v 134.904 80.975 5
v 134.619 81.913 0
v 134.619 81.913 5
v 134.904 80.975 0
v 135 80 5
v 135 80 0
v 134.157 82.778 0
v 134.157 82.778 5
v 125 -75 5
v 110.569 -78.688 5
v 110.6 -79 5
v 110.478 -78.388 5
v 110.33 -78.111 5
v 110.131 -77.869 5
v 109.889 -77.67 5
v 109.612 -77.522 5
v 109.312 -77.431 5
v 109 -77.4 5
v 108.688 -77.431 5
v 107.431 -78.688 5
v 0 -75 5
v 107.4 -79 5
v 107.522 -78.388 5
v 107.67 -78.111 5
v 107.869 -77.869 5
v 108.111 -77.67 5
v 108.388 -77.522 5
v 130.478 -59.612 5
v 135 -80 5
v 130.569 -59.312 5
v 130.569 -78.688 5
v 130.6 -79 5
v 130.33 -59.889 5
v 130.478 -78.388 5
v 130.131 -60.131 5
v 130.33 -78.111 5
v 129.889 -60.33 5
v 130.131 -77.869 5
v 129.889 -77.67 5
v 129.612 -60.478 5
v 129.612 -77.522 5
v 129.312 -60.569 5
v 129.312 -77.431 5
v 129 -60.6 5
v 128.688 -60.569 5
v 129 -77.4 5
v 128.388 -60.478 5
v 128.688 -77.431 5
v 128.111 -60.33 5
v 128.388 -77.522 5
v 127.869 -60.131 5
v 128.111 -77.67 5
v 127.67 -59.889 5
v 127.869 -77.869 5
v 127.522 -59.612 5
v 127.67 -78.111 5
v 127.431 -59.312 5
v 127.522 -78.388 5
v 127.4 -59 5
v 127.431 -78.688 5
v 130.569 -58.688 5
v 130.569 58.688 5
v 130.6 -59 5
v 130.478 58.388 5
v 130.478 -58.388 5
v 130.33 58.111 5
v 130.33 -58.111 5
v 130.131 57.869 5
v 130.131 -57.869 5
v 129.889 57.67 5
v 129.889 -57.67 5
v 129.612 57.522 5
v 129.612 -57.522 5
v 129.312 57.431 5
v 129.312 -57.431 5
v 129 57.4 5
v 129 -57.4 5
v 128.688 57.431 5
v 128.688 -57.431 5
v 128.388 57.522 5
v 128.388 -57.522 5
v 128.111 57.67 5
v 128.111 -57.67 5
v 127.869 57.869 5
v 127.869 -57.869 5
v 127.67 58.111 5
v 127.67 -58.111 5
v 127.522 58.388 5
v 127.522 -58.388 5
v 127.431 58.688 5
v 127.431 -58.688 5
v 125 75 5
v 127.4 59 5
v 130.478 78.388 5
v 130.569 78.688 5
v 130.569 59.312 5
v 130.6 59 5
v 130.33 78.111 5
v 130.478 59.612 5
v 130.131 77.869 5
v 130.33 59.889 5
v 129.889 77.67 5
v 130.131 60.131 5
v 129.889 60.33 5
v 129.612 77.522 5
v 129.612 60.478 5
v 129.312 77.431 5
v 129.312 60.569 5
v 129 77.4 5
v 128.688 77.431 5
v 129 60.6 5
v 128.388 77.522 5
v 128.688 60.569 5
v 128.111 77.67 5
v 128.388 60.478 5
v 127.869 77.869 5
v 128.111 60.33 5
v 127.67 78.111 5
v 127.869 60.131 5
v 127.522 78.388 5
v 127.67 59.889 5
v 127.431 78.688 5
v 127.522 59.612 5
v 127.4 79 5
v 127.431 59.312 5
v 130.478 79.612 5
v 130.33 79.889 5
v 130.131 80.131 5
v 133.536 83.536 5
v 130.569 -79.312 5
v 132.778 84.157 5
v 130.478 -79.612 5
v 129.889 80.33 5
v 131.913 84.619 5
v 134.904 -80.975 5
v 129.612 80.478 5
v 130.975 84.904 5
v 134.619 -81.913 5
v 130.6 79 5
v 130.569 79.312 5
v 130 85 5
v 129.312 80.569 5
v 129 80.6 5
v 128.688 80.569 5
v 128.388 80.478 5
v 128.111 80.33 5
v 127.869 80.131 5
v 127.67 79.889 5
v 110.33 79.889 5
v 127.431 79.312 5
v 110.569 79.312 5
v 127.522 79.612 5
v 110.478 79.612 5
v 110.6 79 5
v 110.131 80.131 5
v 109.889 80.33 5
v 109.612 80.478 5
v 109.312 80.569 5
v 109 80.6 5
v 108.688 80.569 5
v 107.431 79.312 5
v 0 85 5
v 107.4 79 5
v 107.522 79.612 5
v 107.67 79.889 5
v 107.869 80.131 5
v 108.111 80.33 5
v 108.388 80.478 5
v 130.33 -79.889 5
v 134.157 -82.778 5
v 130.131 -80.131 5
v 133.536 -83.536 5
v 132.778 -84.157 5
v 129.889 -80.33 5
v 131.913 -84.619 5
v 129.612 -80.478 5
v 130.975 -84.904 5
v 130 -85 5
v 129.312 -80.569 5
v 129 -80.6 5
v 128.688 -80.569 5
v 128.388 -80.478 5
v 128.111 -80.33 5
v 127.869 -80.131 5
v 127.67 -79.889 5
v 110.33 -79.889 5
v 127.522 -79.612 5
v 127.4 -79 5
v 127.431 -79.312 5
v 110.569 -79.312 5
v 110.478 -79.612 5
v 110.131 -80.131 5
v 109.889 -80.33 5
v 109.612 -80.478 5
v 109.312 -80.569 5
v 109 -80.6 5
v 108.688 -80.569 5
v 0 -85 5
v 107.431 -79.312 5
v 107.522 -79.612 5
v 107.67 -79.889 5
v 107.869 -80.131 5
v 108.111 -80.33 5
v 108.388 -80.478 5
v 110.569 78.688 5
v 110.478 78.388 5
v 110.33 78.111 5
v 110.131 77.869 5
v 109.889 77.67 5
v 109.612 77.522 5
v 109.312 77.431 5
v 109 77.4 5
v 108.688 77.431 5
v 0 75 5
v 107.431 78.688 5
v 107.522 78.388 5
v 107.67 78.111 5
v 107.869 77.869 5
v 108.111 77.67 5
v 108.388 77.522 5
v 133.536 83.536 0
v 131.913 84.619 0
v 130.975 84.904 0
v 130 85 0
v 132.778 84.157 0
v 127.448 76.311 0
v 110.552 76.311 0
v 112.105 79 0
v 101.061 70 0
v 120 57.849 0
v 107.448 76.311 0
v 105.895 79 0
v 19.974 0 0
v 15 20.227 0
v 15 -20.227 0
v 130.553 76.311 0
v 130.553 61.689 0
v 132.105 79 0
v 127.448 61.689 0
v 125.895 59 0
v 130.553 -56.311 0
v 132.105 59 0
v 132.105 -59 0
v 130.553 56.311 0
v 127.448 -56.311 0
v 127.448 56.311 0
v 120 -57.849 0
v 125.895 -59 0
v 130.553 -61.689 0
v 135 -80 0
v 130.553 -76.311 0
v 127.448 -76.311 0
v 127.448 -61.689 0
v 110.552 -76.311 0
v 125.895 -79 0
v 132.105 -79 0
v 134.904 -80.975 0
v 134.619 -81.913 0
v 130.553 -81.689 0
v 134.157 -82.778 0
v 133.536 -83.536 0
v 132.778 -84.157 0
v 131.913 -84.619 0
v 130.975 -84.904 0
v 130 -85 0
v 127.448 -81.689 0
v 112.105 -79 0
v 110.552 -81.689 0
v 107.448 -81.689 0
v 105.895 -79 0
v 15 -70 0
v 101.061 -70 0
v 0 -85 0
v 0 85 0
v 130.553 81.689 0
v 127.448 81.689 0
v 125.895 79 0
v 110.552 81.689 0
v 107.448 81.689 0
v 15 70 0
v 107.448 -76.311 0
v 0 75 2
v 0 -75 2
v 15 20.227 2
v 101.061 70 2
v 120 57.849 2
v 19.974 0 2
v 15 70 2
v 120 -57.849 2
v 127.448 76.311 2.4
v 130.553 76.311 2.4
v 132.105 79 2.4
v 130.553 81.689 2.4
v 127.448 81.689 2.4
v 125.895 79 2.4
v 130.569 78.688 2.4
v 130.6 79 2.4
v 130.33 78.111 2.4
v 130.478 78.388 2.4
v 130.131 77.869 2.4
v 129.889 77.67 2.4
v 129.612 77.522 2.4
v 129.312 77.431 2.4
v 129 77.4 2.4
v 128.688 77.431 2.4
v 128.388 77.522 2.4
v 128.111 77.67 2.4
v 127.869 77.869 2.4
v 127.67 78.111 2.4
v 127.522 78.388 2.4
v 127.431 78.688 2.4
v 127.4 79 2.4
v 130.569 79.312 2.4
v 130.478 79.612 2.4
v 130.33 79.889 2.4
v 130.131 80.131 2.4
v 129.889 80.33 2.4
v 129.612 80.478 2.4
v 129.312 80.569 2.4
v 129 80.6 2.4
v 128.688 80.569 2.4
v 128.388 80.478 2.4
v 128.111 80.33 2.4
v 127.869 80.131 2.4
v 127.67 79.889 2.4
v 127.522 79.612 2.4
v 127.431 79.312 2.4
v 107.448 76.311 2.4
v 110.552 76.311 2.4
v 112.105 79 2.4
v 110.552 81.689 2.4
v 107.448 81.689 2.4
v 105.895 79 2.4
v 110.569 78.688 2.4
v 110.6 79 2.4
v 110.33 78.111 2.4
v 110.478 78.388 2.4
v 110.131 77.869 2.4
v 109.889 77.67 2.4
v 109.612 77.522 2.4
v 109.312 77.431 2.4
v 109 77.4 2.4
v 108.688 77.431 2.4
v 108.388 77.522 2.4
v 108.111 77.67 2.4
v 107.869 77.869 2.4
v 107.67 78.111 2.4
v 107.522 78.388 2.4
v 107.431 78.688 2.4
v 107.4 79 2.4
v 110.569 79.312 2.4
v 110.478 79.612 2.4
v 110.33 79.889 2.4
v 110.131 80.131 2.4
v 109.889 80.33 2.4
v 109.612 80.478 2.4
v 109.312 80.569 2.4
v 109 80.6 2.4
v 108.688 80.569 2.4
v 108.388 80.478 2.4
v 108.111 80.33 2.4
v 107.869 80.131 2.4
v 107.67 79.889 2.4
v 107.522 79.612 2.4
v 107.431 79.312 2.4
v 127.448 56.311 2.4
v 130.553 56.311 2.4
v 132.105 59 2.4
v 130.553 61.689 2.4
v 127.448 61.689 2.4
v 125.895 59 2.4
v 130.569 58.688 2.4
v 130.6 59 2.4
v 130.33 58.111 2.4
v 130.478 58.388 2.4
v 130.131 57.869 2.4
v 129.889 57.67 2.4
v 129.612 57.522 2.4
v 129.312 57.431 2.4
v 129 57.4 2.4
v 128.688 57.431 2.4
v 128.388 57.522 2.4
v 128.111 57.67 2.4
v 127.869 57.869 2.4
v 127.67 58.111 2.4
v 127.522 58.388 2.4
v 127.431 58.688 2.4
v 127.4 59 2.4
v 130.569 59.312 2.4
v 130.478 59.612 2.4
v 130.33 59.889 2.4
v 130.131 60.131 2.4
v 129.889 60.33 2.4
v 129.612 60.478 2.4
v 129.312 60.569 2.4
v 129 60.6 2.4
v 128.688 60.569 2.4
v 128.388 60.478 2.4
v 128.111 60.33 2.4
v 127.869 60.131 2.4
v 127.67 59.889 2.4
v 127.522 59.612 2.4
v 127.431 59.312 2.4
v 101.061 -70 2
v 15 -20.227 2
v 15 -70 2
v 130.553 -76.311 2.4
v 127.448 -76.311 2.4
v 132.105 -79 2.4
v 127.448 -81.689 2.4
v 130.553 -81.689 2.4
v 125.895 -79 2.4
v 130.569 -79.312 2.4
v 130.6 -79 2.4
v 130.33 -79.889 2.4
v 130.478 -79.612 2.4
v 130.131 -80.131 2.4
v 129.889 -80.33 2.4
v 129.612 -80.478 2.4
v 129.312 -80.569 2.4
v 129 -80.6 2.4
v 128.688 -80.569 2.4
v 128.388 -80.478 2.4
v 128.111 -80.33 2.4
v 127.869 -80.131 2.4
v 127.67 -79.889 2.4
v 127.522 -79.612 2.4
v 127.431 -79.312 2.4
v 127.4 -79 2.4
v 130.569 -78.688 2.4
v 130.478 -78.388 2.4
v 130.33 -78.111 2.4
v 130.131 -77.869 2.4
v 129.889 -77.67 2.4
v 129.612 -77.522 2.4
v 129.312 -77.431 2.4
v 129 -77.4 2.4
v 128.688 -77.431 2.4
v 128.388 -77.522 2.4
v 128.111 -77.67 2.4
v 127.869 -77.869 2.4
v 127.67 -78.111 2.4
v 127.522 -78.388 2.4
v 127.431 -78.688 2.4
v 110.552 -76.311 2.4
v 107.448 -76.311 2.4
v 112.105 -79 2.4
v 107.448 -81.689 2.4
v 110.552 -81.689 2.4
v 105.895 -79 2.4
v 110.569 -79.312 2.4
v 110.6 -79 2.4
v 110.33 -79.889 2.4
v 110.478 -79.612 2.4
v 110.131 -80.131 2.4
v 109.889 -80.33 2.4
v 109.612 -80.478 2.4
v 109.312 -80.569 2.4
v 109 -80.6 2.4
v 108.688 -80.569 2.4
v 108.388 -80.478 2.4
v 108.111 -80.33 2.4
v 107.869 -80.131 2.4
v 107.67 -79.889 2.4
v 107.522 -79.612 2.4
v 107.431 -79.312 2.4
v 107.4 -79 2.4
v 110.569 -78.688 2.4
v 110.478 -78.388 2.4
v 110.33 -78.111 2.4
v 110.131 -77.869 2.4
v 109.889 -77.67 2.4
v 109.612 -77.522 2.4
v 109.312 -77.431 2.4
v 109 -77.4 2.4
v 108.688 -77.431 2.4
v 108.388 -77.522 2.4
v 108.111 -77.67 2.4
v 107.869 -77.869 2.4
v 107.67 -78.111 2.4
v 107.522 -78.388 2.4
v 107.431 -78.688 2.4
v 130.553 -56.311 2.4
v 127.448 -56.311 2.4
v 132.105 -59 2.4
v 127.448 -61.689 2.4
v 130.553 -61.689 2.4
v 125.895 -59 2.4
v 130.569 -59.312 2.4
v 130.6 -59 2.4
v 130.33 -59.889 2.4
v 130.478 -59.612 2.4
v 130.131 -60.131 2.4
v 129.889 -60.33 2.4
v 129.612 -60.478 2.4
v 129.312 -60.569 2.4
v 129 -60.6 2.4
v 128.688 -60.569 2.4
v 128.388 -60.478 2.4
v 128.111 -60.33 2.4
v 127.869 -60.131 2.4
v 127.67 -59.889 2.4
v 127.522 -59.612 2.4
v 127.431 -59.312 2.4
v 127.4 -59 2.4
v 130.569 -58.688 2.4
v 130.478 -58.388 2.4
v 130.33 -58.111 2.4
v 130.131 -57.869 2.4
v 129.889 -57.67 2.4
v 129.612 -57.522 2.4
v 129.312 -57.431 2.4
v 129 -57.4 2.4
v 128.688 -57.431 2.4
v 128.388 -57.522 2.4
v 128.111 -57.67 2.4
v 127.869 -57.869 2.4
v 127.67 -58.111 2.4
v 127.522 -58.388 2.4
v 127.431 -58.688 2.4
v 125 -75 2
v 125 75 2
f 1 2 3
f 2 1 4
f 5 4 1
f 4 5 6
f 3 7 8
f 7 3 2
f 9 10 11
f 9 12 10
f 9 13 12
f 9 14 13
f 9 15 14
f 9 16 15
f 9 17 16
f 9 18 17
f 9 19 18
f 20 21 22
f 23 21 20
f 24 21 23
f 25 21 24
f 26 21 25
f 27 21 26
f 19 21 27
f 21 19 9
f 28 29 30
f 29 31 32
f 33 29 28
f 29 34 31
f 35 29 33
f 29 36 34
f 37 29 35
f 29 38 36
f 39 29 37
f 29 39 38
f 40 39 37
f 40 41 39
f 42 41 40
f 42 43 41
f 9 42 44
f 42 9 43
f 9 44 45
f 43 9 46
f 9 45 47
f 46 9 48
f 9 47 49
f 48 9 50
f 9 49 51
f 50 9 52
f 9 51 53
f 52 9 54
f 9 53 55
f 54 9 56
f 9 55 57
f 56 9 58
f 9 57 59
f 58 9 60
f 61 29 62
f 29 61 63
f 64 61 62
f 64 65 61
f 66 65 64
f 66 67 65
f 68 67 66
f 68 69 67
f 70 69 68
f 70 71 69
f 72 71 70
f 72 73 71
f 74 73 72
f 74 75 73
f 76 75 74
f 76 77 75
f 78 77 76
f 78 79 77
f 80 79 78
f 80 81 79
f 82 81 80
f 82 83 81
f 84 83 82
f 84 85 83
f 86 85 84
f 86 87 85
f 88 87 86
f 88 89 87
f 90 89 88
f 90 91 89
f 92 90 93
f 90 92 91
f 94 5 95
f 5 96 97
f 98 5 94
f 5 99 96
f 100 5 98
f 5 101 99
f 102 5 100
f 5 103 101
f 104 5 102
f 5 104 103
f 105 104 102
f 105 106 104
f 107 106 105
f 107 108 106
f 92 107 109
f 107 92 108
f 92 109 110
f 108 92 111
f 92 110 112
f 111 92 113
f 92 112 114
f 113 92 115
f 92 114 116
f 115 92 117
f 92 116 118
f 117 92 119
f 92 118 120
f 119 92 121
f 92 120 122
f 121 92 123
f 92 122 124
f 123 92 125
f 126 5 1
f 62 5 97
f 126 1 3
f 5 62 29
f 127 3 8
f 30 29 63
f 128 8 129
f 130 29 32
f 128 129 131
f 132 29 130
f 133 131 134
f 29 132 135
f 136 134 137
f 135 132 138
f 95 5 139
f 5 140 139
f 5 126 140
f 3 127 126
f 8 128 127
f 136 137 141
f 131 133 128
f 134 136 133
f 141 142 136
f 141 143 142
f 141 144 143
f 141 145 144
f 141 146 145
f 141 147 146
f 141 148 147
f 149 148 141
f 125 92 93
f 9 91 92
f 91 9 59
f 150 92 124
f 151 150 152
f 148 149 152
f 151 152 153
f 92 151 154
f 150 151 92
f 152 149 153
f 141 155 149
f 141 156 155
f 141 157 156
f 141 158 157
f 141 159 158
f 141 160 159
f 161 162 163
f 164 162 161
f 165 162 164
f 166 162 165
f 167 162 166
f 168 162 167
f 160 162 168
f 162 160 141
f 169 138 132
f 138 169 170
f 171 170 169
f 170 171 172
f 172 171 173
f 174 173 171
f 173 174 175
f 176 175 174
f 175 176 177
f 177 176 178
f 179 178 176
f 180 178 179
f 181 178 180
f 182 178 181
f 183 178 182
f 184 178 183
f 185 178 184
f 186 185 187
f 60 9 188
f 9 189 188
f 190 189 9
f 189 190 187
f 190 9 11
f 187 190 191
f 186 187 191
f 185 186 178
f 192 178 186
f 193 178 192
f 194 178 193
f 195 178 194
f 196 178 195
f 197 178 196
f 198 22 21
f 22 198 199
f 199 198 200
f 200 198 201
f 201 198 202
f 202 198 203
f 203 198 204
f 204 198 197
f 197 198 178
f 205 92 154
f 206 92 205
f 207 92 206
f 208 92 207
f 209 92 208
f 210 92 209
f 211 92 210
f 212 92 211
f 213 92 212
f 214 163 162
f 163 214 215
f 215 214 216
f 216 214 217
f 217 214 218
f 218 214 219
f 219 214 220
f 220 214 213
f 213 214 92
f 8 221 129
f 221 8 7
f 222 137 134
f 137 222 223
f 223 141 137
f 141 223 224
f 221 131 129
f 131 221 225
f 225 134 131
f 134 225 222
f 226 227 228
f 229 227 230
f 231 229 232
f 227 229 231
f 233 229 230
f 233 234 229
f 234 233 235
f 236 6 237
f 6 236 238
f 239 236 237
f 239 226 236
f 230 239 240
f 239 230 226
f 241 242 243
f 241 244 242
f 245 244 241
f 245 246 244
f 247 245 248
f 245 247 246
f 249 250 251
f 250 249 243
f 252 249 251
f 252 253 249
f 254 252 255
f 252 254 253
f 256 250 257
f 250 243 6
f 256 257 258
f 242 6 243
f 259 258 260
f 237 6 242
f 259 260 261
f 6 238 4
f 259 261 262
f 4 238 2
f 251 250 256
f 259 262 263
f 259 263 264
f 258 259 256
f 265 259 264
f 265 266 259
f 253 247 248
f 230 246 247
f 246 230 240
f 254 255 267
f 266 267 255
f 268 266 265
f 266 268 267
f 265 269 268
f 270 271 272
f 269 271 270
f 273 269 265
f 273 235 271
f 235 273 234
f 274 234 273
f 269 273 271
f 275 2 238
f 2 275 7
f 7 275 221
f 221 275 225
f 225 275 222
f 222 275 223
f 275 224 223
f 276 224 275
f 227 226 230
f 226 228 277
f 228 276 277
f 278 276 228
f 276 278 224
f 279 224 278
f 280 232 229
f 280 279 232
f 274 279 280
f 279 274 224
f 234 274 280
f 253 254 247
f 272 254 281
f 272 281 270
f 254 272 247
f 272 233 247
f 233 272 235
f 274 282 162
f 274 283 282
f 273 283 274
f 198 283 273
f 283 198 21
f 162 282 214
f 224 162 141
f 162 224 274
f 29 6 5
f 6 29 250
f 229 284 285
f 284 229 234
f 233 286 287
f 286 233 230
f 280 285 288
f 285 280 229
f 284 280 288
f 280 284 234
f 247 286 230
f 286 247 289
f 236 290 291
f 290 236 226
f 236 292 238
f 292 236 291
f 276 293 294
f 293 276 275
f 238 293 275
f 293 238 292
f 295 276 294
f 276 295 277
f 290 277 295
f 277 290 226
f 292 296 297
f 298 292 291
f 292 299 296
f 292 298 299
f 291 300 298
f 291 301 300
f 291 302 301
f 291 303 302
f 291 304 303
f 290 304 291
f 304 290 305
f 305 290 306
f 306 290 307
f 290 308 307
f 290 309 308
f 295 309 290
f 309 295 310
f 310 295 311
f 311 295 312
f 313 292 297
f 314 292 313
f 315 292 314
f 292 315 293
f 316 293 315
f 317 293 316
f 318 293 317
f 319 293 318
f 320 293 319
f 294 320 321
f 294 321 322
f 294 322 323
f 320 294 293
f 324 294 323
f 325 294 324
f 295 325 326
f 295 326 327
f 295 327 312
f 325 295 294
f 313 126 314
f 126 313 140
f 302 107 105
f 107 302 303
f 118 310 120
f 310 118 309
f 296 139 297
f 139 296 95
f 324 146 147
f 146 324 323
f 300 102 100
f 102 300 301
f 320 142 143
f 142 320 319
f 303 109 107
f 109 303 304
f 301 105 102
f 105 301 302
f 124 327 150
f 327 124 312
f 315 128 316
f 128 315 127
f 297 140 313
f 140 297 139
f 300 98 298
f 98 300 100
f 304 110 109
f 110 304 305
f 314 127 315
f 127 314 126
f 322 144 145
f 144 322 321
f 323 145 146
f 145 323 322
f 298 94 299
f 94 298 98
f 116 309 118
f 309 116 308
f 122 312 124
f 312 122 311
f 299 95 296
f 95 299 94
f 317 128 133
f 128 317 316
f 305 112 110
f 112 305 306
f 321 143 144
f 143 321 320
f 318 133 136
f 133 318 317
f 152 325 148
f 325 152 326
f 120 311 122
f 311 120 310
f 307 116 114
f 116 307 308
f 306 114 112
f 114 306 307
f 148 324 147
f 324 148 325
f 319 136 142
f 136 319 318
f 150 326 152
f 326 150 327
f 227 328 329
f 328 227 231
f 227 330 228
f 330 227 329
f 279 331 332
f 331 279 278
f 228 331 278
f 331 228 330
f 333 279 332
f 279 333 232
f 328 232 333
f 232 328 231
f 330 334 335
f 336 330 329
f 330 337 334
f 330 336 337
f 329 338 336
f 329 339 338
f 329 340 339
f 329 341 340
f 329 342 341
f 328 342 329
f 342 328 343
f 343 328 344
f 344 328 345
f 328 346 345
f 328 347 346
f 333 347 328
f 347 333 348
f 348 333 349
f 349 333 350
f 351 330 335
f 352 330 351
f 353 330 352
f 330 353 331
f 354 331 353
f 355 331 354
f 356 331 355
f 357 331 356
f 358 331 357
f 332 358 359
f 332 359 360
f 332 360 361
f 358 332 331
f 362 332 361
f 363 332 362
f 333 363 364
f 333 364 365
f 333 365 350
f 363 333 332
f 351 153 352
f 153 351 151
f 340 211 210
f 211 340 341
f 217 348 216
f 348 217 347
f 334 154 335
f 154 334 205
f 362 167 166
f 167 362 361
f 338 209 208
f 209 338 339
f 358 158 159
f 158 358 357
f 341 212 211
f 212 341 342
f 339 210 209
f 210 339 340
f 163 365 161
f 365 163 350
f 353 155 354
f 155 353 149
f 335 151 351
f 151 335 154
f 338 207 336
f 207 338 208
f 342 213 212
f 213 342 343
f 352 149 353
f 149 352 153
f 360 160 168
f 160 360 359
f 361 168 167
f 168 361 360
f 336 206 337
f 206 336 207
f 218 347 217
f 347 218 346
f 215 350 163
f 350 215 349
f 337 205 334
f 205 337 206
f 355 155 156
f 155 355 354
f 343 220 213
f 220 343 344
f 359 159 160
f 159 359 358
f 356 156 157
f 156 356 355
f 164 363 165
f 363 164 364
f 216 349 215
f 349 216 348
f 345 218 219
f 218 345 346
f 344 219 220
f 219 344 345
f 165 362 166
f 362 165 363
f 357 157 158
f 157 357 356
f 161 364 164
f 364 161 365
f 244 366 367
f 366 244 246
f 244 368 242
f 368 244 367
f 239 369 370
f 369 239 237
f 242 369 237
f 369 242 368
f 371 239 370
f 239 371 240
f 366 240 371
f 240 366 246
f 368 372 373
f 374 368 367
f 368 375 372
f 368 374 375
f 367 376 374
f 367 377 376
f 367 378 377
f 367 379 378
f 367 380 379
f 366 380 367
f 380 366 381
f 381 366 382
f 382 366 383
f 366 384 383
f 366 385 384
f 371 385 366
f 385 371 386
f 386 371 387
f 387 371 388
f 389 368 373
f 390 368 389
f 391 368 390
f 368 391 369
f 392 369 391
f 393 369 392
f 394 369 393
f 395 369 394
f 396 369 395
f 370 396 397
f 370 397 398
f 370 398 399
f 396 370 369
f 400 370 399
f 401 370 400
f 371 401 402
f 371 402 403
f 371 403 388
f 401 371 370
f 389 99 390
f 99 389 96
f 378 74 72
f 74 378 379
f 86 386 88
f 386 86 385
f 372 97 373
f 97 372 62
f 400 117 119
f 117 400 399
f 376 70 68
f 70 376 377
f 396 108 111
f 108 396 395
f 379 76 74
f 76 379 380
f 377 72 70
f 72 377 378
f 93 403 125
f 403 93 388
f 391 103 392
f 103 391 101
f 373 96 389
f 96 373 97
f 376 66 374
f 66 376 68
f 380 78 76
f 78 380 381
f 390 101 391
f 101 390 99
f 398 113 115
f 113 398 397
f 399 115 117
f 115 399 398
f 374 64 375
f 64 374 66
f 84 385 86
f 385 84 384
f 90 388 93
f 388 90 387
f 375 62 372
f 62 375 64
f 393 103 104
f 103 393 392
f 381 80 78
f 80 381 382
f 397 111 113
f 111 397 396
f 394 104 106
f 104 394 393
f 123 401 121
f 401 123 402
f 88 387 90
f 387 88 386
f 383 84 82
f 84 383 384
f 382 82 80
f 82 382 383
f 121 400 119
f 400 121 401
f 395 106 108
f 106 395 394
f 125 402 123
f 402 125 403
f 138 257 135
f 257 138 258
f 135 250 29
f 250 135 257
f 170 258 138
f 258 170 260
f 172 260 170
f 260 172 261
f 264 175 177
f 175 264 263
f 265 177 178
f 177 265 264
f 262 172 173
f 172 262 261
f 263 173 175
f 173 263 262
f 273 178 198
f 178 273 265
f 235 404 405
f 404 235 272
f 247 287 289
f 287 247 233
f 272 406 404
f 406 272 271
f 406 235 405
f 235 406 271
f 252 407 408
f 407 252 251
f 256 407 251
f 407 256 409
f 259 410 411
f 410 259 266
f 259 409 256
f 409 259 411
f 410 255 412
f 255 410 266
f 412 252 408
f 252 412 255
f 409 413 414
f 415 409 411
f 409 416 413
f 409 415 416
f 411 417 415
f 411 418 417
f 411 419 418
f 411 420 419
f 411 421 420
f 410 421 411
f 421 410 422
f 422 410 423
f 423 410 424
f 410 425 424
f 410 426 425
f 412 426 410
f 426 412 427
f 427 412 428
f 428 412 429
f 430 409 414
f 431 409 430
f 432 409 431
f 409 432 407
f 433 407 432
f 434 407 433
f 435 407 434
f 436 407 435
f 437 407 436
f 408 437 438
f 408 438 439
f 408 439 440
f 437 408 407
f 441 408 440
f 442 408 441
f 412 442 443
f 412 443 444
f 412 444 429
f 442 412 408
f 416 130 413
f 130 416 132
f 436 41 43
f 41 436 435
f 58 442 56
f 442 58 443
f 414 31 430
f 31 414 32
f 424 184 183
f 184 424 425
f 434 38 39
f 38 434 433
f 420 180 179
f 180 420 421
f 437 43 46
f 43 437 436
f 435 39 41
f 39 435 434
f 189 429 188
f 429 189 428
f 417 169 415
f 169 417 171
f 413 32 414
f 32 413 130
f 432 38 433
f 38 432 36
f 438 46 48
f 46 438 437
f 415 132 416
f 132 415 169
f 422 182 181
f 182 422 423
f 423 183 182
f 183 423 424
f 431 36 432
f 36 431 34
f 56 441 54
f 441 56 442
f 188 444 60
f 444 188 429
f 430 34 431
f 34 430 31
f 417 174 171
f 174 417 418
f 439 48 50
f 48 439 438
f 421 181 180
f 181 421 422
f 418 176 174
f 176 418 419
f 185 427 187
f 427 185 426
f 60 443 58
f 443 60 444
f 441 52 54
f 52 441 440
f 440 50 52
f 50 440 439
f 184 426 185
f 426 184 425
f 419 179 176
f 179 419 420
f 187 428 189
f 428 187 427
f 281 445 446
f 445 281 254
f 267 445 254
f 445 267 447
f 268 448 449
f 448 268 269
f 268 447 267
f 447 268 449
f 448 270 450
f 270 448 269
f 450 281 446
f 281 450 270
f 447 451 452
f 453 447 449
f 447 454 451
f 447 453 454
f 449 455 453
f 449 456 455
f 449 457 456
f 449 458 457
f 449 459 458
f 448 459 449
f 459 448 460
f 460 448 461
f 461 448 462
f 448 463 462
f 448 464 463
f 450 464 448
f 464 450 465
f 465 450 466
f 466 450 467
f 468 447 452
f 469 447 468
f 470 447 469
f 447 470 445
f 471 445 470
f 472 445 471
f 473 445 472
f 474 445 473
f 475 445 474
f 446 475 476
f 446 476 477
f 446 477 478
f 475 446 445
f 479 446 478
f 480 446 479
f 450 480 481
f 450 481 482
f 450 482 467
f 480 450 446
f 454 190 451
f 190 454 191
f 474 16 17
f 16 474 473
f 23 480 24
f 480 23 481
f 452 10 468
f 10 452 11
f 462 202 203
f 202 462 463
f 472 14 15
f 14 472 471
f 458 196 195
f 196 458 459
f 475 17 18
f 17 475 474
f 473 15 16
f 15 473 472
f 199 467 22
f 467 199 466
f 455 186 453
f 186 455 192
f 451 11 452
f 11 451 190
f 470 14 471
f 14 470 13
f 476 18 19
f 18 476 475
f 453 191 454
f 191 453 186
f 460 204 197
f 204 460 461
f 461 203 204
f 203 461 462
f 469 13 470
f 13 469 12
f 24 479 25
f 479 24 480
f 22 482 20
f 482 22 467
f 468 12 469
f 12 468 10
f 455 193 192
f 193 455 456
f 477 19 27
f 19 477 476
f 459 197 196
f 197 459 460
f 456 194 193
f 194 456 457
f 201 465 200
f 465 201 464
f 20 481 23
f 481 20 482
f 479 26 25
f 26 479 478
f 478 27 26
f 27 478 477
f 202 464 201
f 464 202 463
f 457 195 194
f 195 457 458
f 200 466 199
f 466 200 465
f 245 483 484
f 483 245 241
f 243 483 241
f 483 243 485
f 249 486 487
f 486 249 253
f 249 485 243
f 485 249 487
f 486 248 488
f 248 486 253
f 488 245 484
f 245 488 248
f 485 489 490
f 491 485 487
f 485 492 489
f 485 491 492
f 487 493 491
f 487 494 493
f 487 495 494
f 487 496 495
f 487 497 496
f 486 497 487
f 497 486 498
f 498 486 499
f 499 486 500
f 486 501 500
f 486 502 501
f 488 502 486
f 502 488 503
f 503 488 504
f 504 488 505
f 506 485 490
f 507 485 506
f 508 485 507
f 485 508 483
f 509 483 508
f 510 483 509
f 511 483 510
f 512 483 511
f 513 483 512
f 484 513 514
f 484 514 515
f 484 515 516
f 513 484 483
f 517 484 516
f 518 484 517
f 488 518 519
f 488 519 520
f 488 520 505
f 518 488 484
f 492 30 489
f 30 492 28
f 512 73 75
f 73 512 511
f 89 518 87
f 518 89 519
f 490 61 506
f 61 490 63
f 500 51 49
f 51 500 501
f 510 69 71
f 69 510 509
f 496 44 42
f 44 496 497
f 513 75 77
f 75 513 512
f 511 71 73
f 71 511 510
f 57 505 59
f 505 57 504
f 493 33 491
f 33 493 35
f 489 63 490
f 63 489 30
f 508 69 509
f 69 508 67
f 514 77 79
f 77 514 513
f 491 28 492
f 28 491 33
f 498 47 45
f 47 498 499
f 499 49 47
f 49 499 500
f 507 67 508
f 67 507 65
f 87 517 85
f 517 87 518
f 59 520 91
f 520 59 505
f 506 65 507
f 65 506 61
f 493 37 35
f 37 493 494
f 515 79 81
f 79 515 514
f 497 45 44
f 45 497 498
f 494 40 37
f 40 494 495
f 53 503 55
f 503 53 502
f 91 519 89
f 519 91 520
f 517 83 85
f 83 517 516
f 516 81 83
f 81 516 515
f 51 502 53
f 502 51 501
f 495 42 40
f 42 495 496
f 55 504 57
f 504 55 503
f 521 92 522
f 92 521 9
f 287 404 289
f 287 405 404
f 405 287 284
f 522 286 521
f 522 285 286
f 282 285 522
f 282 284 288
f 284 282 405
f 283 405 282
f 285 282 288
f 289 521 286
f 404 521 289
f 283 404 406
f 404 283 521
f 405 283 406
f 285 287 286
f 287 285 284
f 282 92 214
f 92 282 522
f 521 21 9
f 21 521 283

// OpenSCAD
// file: ../common/din/base.scad
DIN_TOLERANCE = 0.1;

module din_help(name, _STD_TABLE) {
    echo("-----------------------------");
    echo(str("Size indexes for ", name));
    for(idx=[0:len(_STD_TABLE)-1]) {
        echo(str(idx, " = M", _STD_TABLE[idx][0]));
    }
    echo("-----------------------------");
}

module din_cutout_base(inner, outer, cap_height, height, fn) {
    translate([0, 0, height]) {
        mirror([0, 0, 1]) {
            cylinder(r=outer/2 + DIN_TOLERANCE, h=cap_height, center=false, $fn = fn);
            cylinder(r=inner/2 + DIN_TOLERANCE, h=height + 0.1, center=false, $fn = 32);
        }
    }
}

module hex_nut(inner, outer, cap_height, height = 0) {
    din_cutout_base(inner, outer, cap_height, height, 6);
}

module round_bolt(inner, outer, cap_height, height = 0) {
    din_cutout_base(inner, outer, cap_height, height, 32);
}

translate([-10, 0, 0]) round_bolt(inner = 3, outer = 6.01, cap_height = 2.4, height = 10);
translate([10, 0, 0]) hex_nut(inner = 3, outer = 6.01, cap_height = 2.4, height = 10);
// file: ../common/din/din934.scad
use <./base.scad>
/*
    format: [size, diameter, cap_height]
            [d1, e, m]
*/
_DIN_934_STD = [[1,2.72,0.8],[1.2,3.29,1],[1.4,3.29,1.2],[1.6,3.48,1.3],[1.7,3.82,1.4],[2,4.32,1.6],[2.3,4.95,1.8],[2.5,5.45,2],[2.6,5.51,2],[3,6.01,2.4],[3.5,6.01,2.8],[4,7.66,3.2],[5,8.76,4],[6,11.05,5],[7,12.12,5.5],[8,14.38,6.5],[10,18.9,8],[12,21.1,10],[14,24.49,11],[16,26.75,13],[18,29.56,15],[20,32.95,16],[22,35.03,18],[24,39.55,19],[27,45.2,22],[30,50.85,24],[33,55.37,26],[36,60.79,29],[39,66.44,31],[42,71.3,34],[45,76.95,36],[48,82.6,38],[52,88.25,42],[56,95.07,45],[60,100.72,48],[64,106.37,51],[68,112.02,54],[72,117.67,58],[76,123.32,61],[80,128.97,64],[85,133.11,68],[90,145.77,72],[95,151.42,76],[100,162.72,80],[105,16837,84],[110,174.02,88],[115,185.32,92],[120,190.97,96],[125,202.27,100],[130,207.75,104],[135,213.4,108],[140,224.7,112],[145,236,116],[150,236,120]];

module din934_help() {
    din_help("DIN 934", _DIN_934_STD);
}

module din934_base(m_idx, height) {
    row = _DIN_934_STD[m_idx];
    inner = row[0];
    outer = row[1];
    cap_height = row[2];
    hex_nut(inner, outer, cap_height, height);
}

module din934(m_idx, height, coords) {
    difference() {
        children();
        for(i=[0:len(coords) - 1]) {
            translate([coords[i][0], coords[i][1], 0])
                din934_base(m_idx, height);
        }
    }
}

din934_help();

/*
din934(9, 10, [[5, 5]]) {
    cube([10, 10, 10]);
}
*/
// file: ../common/din/din912.scad
use <./base.scad>
/*
    format: [size, diameter, cap_height]
            [d1, d2, k]
*/
_DIN_912_STD = [[2,3.8,2],[3,5.5,3],[4,7,4],[5,8.5,5],[6,10,6],[8,13,8],[10,16,10],[12,18,12],[14,21,14],[16,24,16],[18,27,18],[20,30,20],[24,36,24],[27,40,27],[30,45,30],[36,54,36]];

module din912_help() {
    din_help("DIN 912", _DIN_912_STD);
}

module din912_base(m_idx, height) {
    row = _DIN_912_STD[m_idx];
    inner = row[0];
    outer = row[1];
    cap_height = row[2];
    round_bolt(inner, outer, cap_height, height);
}

module din912(m_idx, height, coords) {
    difference() {
        children();
        for(i=[0:len(coords) - 1]) {
            translate([coords[i][0], coords[i][1], 0])
                din912_base(m_idx, height);
        }
    }
}

din912_help();

/*
din912(1, 10, [[5, 5]]) {
    cube([10, 10, 10]);
}
*/
// main file
include <../common/din/din912.scad>
include <../common/din/din934.scad>

PLATE_SIZE_X = 250;
PLATE_SIZE_Y = 150;
PLATE_SIZE_Z = 3;

FRAME_BACK_BAR_WIDTH = 20;
FRAME_BACK_BAR_SIZE_Z = 5;


INNER_CORNER_RADIUS = 5;

FRAME_ADD_X = 10;
FRAME_ADD_Y = 10;

FRAME_BAR_ANGLE_ADJUST = 2;

FRAME_BAR_SIDE_THICKNESS = 15;

module bar(add_x = 0, add_y = 0) {
    FRAME_BACK_BAR_LENGTH = sqrt(pow(PLATE_SIZE_X / 2 + add_x, 2) + pow(PLATE_SIZE_Y / 2 + add_y, 2));
    angle = asin(PLATE_SIZE_Y / 2 / FRAME_BACK_BAR_LENGTH);
    rotate([0, 0, angle + FRAME_BAR_ANGLE_ADJUST])
        translate([0, 0 - FRAME_BACK_BAR_WIDTH / 2, 0])
            cube([FRAME_BACK_BAR_LENGTH, FRAME_BACK_BAR_WIDTH, FRAME_BACK_BAR_SIZE_Z]);
}

module base_plate(size_z, add_x = 0, add_y = 0, corner_radius = INNER_CORNER_RADIUS) {
    translate([PLATE_SIZE_X / 2 - corner_radius + add_x, PLATE_SIZE_Y / 2 - corner_radius + add_y, 0])
        cylinder(r=corner_radius, h=size_z, $fn=32);
    cube([PLATE_SIZE_X / 2 - corner_radius + add_x, PLATE_SIZE_Y / 2 + add_y, size_z]);
    cube([PLATE_SIZE_X / 2 + add_x, PLATE_SIZE_Y / 2 - corner_radius + add_y, size_z]);
}

module side_bar(thickness = FRAME_BAR_SIDE_THICKNESS) {
    cube([thickness, PLATE_SIZE_Y / 2 - INNER_CORNER_RADIUS + FRAME_ADD_X, FRAME_BACK_BAR_SIZE_Z]);
}

module quarter_raw() {
    intersection() {
        bar(FRAME_ADD_X, FRAME_ADD_Y);
        base_plate(FRAME_BACK_BAR_SIZE_Z, FRAME_ADD_X, FRAME_ADD_Y);
    }
    translate([0, PLATE_SIZE_Y / 2 - FRAME_BAR_SIDE_THICKNESS + FRAME_ADD_Y, 0])
        cube([PLATE_SIZE_X / 2 - INNER_CORNER_RADIUS + FRAME_ADD_X, FRAME_BAR_SIDE_THICKNESS, FRAME_BACK_BAR_SIZE_Z]);
    side_bar( FRAME_BAR_SIDE_THICKNESS );
    translate([PLATE_SIZE_X / 2 - FRAME_BAR_SIDE_THICKNESS + FRAME_ADD_X, 0, 0])
        side_bar();
}

module quarter() {
    start_x = PLATE_SIZE_X / 2 - INNER_CORNER_RADIUS + FRAME_ADD_X - 1;
    start_y = PLATE_SIZE_Y / 2 - INNER_CORNER_RADIUS + FRAME_ADD_Y - 1;

    JOINT_COORDS = [
        [start_x, start_y],
        [start_x - 20, start_y],
        [start_x, start_y - 20]
    ];

    din934(9, FRAME_BACK_BAR_SIZE_Z, JOINT_COORDS) {
        quarter_raw();
    }
}

difference() {
    translate([0, 0, FRAME_BACK_BAR_SIZE_Z]) {
        mirror([0, 0, 1]) {
            quarter();
            mirror([0, 1, 0])
                quarter();
        }
    }
    translate([0, 0, PLATE_SIZE_Z / 2 + 2]) cube([PLATE_SIZE_X, PLATE_SIZE_Y, PLATE_SIZE_Z], center=true);
}

/* color("lime") translate([0, 0, PLATE_SIZE_Z / 2 + 2]) cube([PLATE_SIZE_X, PLATE_SIZE_Y, PLATE_SIZE_Z], center=true); */
